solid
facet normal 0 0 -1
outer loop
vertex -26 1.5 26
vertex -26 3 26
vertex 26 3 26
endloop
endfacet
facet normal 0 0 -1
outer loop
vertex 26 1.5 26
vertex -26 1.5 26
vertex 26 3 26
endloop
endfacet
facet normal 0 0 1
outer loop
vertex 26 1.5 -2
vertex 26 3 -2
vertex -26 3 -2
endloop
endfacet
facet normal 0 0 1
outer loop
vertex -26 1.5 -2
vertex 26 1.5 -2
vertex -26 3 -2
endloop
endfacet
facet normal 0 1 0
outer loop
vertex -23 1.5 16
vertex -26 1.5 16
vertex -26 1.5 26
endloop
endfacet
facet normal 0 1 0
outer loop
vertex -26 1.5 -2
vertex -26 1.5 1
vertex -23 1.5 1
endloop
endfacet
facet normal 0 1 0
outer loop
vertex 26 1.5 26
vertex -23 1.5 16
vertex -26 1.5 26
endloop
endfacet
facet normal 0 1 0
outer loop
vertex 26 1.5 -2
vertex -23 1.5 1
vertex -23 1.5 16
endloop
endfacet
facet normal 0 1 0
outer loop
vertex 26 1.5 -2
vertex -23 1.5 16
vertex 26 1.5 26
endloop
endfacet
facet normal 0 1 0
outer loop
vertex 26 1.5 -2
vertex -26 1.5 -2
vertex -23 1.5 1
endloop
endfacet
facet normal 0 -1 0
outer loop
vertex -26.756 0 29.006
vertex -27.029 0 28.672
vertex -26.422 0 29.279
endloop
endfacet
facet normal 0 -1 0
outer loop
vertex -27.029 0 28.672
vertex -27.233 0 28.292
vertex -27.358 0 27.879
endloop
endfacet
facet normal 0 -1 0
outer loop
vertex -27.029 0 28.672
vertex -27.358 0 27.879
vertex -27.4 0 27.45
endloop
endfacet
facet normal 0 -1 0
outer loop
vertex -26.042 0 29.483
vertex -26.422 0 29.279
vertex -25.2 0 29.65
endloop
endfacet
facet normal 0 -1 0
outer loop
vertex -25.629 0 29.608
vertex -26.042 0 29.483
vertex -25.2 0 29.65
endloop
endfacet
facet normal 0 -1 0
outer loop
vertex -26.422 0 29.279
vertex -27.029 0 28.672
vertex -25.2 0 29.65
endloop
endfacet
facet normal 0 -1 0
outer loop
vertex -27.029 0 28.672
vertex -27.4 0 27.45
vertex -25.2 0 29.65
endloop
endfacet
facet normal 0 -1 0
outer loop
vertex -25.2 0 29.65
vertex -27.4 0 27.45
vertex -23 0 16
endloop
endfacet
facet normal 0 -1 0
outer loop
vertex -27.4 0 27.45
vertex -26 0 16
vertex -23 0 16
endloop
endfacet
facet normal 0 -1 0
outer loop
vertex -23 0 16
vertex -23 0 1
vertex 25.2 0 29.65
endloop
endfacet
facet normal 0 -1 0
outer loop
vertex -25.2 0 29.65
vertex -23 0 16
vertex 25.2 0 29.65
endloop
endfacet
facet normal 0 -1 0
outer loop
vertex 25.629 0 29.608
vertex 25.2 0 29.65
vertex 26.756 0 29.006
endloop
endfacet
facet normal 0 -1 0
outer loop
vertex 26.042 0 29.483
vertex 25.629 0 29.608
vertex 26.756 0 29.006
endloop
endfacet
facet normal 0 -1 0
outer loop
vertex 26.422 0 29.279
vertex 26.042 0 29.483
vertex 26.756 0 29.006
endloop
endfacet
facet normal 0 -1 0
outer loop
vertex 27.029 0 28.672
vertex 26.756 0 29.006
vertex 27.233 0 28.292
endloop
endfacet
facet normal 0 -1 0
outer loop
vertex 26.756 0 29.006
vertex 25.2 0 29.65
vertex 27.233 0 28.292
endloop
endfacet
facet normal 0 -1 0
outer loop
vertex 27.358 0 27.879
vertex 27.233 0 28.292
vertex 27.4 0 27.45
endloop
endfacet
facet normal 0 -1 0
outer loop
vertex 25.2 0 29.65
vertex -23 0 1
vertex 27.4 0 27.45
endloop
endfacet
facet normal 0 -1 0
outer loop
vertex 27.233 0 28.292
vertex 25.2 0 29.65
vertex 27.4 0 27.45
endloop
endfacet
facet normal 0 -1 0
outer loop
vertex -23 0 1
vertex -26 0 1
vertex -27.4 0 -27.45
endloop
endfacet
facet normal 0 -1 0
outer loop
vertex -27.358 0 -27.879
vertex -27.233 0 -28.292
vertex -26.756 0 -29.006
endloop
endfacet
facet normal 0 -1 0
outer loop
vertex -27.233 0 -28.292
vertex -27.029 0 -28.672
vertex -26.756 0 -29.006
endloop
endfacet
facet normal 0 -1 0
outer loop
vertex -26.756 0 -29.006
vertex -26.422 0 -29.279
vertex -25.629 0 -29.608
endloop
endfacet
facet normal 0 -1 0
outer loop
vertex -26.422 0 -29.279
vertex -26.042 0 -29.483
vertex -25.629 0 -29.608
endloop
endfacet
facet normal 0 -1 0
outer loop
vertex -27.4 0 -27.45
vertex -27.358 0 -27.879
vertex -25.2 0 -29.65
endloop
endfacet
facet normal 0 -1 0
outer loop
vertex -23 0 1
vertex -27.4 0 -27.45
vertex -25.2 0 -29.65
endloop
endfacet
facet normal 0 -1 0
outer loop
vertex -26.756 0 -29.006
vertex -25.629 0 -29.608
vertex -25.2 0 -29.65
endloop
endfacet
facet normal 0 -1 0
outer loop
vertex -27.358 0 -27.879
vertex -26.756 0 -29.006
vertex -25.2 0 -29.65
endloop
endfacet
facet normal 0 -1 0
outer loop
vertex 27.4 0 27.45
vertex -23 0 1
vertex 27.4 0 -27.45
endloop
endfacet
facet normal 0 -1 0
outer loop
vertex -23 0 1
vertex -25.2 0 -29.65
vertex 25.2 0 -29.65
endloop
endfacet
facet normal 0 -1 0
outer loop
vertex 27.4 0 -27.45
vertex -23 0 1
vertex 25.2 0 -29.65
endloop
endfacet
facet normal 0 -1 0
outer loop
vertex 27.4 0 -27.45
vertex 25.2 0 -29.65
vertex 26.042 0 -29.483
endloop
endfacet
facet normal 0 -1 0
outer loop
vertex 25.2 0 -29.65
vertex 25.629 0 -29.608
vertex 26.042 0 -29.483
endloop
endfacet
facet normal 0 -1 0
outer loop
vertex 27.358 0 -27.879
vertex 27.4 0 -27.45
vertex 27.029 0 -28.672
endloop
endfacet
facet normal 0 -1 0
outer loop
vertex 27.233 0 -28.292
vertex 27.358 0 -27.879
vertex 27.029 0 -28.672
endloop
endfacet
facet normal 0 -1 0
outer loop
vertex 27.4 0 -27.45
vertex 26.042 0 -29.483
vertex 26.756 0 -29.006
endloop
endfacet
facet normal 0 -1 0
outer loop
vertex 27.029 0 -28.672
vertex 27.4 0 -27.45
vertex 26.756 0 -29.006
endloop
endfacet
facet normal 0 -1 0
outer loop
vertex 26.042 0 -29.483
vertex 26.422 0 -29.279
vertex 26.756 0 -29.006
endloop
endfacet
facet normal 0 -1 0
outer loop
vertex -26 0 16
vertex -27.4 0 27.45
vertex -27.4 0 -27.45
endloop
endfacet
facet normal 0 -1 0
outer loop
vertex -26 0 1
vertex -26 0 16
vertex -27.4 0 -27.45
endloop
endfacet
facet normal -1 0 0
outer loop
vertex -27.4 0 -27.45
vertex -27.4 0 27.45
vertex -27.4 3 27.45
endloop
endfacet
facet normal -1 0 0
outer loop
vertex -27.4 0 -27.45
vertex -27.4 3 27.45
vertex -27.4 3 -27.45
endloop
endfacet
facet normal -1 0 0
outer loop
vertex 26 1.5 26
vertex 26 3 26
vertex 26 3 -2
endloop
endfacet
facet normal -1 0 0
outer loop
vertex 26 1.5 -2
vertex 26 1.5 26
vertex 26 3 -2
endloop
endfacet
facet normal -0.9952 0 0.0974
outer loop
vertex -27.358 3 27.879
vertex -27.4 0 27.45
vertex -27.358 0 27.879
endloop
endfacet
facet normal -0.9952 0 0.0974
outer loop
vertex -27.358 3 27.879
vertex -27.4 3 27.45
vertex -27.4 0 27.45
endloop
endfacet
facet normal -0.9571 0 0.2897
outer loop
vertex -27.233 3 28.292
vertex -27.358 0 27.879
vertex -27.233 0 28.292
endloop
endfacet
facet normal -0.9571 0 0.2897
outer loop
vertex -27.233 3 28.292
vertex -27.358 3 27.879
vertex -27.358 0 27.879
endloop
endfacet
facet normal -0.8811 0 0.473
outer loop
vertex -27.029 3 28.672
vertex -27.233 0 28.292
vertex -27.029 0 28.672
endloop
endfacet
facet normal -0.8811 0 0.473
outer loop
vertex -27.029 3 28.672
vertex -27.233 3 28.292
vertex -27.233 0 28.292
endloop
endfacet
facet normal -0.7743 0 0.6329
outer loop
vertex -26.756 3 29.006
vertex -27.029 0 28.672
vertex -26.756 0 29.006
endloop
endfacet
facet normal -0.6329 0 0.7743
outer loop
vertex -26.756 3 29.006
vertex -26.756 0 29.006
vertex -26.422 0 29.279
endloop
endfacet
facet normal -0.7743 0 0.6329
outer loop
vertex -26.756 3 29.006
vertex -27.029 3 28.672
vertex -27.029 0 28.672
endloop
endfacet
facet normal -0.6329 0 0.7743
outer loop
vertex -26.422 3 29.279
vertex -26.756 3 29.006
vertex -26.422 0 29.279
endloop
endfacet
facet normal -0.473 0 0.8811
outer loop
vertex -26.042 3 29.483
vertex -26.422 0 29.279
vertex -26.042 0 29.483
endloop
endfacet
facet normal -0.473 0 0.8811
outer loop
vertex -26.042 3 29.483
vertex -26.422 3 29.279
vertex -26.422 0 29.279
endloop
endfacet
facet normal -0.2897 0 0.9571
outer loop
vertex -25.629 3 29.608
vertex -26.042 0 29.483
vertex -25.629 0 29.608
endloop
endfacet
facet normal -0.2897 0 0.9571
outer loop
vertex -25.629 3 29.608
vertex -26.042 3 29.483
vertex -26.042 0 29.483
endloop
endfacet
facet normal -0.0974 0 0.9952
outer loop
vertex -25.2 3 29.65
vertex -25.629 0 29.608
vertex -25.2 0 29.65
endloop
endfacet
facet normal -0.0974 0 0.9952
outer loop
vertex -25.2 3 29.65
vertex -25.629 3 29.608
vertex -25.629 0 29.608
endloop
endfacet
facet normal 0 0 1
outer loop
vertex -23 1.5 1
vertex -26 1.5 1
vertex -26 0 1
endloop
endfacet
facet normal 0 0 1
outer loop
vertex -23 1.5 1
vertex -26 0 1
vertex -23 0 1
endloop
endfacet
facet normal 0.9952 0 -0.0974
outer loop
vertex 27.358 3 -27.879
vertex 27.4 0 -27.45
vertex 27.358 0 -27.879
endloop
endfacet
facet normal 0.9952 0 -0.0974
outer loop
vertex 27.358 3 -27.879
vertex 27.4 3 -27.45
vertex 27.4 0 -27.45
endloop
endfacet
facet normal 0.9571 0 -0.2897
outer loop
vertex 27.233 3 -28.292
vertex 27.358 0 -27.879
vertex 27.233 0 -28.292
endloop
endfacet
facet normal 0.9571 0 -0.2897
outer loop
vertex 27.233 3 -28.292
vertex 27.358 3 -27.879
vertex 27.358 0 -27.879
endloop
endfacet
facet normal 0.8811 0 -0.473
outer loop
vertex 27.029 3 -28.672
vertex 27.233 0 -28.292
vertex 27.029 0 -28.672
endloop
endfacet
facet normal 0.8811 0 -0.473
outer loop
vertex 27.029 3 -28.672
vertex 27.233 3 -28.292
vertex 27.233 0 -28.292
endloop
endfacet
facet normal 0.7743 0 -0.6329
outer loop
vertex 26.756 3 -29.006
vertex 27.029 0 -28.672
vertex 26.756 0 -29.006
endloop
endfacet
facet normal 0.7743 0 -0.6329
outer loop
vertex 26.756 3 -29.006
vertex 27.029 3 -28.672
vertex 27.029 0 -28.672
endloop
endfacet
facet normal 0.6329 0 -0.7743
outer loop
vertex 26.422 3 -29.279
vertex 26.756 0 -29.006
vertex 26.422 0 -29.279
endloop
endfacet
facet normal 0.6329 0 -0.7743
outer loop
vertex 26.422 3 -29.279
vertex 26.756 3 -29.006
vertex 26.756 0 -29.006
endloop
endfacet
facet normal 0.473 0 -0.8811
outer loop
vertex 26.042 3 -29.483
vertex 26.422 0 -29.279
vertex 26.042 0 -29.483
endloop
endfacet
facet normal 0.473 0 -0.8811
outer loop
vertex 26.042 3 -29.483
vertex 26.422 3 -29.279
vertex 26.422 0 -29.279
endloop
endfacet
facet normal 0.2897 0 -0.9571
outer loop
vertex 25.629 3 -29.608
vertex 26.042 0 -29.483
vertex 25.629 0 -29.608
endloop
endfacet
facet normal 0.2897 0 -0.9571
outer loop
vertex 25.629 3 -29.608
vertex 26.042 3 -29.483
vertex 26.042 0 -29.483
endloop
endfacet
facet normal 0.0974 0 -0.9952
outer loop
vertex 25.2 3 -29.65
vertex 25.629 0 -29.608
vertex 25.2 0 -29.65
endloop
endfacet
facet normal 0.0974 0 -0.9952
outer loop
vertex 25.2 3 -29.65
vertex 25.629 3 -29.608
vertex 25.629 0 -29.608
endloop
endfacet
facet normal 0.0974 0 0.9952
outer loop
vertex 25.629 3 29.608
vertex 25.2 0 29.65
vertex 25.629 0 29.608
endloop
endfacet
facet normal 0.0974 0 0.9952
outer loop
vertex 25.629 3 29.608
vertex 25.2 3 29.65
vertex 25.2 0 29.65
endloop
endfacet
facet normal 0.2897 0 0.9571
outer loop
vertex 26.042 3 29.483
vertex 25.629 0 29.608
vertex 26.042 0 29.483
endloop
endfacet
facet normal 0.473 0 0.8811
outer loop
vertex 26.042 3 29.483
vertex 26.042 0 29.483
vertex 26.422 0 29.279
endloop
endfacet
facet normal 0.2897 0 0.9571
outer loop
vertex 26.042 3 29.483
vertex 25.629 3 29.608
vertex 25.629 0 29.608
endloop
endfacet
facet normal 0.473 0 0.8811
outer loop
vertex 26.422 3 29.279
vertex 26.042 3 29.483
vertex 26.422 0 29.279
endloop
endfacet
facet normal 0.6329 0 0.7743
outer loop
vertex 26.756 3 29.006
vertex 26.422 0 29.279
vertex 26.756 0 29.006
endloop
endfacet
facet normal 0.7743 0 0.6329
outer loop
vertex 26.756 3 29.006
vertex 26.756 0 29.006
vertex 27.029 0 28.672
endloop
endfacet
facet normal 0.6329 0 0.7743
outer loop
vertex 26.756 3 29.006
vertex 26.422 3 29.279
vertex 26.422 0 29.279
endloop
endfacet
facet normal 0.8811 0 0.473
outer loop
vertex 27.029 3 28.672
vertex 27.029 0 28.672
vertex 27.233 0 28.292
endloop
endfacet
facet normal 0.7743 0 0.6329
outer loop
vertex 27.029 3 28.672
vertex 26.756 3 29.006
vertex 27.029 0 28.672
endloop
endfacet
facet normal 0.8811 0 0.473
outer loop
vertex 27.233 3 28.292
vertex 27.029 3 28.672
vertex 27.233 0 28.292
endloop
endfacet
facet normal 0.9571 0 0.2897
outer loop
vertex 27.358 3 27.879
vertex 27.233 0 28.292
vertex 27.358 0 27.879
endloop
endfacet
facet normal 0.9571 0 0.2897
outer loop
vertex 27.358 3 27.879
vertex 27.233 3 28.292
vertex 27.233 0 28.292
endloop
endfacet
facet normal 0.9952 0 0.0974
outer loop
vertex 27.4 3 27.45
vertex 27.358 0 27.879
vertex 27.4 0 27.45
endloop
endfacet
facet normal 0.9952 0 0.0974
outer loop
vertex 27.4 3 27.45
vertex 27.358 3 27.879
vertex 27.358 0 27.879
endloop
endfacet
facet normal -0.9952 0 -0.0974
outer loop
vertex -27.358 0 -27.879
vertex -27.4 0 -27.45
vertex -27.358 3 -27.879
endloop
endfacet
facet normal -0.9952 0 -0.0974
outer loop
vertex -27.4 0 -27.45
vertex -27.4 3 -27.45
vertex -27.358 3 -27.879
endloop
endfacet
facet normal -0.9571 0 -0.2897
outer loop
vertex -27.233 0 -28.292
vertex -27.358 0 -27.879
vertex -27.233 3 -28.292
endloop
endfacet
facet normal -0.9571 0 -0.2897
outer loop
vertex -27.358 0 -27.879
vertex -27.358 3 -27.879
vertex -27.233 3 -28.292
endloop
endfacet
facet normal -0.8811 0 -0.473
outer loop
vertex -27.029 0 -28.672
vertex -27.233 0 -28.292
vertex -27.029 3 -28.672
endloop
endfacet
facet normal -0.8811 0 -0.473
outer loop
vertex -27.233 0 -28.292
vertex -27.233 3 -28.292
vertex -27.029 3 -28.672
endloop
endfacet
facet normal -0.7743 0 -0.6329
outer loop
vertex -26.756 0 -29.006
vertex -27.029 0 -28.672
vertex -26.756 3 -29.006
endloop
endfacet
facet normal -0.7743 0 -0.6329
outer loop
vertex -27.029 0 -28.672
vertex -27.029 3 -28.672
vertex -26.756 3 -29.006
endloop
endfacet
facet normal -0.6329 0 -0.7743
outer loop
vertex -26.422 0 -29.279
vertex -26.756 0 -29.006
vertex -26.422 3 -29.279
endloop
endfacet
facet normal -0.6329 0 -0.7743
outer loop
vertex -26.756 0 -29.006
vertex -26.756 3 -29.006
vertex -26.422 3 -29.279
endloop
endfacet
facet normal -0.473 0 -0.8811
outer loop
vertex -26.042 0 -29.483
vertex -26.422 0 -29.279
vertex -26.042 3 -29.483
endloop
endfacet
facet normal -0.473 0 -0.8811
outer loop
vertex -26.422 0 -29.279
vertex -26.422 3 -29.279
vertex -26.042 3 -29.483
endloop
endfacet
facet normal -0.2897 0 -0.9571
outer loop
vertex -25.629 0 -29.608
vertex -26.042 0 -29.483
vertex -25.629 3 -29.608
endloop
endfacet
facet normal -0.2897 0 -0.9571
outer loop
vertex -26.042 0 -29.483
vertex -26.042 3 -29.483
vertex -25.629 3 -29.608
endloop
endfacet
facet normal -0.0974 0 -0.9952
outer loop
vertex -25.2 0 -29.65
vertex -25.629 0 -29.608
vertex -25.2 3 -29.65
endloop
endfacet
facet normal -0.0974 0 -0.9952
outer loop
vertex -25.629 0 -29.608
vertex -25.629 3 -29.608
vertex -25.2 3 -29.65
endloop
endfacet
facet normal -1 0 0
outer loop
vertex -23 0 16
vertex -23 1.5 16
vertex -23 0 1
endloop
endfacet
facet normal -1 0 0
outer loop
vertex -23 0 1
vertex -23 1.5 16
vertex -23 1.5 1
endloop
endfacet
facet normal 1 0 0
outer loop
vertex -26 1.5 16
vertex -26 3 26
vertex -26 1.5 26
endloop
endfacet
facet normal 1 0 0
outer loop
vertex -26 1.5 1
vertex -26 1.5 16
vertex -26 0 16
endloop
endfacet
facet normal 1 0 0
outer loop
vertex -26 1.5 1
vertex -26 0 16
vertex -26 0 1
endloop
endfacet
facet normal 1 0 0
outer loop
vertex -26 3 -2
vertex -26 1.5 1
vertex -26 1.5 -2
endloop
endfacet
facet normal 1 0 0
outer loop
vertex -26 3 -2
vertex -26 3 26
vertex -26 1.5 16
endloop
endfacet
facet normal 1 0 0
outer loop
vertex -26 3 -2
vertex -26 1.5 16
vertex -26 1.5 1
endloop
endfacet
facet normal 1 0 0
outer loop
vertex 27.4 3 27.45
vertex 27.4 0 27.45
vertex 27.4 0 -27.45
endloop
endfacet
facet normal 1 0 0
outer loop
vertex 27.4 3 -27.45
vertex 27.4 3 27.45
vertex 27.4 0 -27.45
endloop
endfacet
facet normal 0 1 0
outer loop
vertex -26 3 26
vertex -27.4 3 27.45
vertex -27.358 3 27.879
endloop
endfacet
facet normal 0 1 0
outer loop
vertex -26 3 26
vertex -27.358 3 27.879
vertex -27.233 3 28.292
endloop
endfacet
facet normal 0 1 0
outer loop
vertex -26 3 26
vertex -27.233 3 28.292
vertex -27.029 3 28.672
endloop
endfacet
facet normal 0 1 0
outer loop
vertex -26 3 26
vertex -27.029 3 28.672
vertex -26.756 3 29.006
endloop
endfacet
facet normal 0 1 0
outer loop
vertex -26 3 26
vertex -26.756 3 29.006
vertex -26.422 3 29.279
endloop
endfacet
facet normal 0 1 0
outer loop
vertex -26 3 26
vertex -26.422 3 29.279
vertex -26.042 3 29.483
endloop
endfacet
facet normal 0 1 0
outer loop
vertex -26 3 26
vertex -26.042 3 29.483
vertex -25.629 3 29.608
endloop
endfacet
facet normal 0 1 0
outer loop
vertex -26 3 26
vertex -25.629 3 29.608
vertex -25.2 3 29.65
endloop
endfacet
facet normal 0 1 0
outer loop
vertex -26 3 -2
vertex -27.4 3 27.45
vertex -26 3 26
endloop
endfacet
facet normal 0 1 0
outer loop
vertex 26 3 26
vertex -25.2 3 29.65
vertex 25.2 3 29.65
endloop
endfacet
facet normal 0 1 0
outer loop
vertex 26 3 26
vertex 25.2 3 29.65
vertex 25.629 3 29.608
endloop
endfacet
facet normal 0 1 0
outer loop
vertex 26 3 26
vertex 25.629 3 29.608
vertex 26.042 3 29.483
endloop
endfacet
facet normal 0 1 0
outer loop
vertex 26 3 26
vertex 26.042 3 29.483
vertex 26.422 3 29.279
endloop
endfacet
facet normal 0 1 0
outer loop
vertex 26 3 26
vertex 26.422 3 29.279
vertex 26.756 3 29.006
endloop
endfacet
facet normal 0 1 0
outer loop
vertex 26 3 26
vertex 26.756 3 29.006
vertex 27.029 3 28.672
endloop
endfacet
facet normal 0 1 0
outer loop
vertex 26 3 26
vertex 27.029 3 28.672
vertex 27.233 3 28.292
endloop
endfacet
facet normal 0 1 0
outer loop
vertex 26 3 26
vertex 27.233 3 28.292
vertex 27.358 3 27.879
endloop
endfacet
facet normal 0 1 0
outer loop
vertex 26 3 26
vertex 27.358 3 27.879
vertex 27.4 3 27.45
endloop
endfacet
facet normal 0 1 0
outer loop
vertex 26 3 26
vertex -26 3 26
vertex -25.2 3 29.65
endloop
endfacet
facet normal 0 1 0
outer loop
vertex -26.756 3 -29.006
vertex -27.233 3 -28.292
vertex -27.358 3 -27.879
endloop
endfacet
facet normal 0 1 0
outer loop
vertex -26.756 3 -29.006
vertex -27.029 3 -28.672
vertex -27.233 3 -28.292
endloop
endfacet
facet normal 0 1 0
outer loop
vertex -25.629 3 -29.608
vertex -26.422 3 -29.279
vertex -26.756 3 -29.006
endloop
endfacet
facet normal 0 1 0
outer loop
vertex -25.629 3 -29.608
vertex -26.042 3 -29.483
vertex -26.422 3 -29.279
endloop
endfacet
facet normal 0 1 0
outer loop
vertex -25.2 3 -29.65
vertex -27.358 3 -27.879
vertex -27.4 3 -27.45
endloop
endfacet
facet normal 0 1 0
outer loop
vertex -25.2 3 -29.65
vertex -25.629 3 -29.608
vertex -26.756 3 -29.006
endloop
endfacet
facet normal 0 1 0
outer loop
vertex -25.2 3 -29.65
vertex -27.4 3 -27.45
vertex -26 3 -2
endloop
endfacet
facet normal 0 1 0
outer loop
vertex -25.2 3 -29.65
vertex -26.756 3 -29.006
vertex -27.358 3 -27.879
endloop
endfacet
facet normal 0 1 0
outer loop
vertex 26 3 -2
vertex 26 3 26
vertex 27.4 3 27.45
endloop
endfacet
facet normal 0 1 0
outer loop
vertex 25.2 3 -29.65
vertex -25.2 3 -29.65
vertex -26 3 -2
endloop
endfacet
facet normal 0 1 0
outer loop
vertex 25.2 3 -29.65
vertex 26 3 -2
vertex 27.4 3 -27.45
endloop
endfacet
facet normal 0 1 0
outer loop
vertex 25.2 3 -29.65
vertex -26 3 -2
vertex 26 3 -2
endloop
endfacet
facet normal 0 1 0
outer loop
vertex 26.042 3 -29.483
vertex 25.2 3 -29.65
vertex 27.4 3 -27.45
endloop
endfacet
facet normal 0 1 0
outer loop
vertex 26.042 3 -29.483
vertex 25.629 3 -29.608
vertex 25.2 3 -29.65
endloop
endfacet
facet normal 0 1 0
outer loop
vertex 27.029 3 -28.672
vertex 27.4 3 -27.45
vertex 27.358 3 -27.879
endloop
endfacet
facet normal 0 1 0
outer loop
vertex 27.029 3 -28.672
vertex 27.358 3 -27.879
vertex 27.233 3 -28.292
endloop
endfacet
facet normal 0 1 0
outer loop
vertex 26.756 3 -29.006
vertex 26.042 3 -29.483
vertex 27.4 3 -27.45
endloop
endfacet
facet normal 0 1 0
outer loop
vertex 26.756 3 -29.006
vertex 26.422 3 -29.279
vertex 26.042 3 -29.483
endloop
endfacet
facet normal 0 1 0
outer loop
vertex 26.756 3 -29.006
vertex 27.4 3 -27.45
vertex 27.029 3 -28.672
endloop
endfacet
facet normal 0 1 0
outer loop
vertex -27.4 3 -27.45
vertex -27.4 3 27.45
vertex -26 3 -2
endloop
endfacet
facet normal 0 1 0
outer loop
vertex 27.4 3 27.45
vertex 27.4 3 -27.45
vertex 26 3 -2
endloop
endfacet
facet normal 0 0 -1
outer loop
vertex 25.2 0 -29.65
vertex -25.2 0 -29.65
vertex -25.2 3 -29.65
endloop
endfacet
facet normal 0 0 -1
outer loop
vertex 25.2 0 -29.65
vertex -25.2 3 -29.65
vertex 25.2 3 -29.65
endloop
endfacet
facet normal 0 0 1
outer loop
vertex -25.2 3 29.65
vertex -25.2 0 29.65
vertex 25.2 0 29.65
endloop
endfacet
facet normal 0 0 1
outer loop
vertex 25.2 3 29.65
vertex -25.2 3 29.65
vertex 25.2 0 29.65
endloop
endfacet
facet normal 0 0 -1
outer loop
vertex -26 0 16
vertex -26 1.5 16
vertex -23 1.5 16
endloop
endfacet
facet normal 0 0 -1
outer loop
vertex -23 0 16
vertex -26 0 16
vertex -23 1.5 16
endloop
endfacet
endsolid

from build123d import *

# Parameters (mm, degrees)
SKETCH1_W           = 54.8
SKETCH1_H           = 59.3
BOSS_EXTRUDE1_DEPTH = 3
FILLET1_R           = 2.2
SKETCH2_W           = 3
SKETCH2_H           = 15
CUT_EXTRUDE1_DEPTH  = 41.483113764
CUT_EXTRUDE2_DEPTH  = 1.5


with BuildPart() as part:
    # Sketch1 → Boss-Extrude1 (new body)
    with BuildSketch(Plane(origin=(0, 0, 0), x_dir=(1, 0, 0), z_dir=(0, 1, 0))):
        Rectangle(SKETCH1_W, SKETCH1_H)
    extrude(amount=BOSS_EXTRUDE1_DEPTH)

    # Fillet1
    fillet1_edges = [part.edges().sort_by_distance(p)[0] for p in [
        (27.4, 1.5, 29.65),
        (-27.4, 1.5, 29.65),
        (-27.4, 1.5, -29.65),
        (27.4, 1.5, -29.65),
    ]]
    fillet(fillet1_edges, radius=FILLET1_R)

    # Sketch2 → Cut-Extrude1 (cut, through all)
    with BuildSketch(Plane(origin=(0, 3, 0), x_dir=(1, 0, 0), z_dir=(0, 1, 0))):
        with Locations((-24.5, -8.5)):
            Rectangle(SKETCH2_W, SKETCH2_H)
    extrude(amount=-CUT_EXTRUDE1_DEPTH, mode=Mode.SUBTRACT)

    # Sketch2<3> → Cut-Extrude2 (cut)
    with BuildSketch(Plane(origin=(0, 3, 0), x_dir=(1, 0, 0), z_dir=(0, 1, 0))):
        Polygon((-26, -16), (-26, -26), (26, -26), (26, 2), (-26, 2), (-26, -1), (-23, -1), (-23, -16), align=None)
    extrude(amount=-CUT_EXTRUDE2_DEPTH, mode=Mode.SUBTRACT)


solid = part.part
